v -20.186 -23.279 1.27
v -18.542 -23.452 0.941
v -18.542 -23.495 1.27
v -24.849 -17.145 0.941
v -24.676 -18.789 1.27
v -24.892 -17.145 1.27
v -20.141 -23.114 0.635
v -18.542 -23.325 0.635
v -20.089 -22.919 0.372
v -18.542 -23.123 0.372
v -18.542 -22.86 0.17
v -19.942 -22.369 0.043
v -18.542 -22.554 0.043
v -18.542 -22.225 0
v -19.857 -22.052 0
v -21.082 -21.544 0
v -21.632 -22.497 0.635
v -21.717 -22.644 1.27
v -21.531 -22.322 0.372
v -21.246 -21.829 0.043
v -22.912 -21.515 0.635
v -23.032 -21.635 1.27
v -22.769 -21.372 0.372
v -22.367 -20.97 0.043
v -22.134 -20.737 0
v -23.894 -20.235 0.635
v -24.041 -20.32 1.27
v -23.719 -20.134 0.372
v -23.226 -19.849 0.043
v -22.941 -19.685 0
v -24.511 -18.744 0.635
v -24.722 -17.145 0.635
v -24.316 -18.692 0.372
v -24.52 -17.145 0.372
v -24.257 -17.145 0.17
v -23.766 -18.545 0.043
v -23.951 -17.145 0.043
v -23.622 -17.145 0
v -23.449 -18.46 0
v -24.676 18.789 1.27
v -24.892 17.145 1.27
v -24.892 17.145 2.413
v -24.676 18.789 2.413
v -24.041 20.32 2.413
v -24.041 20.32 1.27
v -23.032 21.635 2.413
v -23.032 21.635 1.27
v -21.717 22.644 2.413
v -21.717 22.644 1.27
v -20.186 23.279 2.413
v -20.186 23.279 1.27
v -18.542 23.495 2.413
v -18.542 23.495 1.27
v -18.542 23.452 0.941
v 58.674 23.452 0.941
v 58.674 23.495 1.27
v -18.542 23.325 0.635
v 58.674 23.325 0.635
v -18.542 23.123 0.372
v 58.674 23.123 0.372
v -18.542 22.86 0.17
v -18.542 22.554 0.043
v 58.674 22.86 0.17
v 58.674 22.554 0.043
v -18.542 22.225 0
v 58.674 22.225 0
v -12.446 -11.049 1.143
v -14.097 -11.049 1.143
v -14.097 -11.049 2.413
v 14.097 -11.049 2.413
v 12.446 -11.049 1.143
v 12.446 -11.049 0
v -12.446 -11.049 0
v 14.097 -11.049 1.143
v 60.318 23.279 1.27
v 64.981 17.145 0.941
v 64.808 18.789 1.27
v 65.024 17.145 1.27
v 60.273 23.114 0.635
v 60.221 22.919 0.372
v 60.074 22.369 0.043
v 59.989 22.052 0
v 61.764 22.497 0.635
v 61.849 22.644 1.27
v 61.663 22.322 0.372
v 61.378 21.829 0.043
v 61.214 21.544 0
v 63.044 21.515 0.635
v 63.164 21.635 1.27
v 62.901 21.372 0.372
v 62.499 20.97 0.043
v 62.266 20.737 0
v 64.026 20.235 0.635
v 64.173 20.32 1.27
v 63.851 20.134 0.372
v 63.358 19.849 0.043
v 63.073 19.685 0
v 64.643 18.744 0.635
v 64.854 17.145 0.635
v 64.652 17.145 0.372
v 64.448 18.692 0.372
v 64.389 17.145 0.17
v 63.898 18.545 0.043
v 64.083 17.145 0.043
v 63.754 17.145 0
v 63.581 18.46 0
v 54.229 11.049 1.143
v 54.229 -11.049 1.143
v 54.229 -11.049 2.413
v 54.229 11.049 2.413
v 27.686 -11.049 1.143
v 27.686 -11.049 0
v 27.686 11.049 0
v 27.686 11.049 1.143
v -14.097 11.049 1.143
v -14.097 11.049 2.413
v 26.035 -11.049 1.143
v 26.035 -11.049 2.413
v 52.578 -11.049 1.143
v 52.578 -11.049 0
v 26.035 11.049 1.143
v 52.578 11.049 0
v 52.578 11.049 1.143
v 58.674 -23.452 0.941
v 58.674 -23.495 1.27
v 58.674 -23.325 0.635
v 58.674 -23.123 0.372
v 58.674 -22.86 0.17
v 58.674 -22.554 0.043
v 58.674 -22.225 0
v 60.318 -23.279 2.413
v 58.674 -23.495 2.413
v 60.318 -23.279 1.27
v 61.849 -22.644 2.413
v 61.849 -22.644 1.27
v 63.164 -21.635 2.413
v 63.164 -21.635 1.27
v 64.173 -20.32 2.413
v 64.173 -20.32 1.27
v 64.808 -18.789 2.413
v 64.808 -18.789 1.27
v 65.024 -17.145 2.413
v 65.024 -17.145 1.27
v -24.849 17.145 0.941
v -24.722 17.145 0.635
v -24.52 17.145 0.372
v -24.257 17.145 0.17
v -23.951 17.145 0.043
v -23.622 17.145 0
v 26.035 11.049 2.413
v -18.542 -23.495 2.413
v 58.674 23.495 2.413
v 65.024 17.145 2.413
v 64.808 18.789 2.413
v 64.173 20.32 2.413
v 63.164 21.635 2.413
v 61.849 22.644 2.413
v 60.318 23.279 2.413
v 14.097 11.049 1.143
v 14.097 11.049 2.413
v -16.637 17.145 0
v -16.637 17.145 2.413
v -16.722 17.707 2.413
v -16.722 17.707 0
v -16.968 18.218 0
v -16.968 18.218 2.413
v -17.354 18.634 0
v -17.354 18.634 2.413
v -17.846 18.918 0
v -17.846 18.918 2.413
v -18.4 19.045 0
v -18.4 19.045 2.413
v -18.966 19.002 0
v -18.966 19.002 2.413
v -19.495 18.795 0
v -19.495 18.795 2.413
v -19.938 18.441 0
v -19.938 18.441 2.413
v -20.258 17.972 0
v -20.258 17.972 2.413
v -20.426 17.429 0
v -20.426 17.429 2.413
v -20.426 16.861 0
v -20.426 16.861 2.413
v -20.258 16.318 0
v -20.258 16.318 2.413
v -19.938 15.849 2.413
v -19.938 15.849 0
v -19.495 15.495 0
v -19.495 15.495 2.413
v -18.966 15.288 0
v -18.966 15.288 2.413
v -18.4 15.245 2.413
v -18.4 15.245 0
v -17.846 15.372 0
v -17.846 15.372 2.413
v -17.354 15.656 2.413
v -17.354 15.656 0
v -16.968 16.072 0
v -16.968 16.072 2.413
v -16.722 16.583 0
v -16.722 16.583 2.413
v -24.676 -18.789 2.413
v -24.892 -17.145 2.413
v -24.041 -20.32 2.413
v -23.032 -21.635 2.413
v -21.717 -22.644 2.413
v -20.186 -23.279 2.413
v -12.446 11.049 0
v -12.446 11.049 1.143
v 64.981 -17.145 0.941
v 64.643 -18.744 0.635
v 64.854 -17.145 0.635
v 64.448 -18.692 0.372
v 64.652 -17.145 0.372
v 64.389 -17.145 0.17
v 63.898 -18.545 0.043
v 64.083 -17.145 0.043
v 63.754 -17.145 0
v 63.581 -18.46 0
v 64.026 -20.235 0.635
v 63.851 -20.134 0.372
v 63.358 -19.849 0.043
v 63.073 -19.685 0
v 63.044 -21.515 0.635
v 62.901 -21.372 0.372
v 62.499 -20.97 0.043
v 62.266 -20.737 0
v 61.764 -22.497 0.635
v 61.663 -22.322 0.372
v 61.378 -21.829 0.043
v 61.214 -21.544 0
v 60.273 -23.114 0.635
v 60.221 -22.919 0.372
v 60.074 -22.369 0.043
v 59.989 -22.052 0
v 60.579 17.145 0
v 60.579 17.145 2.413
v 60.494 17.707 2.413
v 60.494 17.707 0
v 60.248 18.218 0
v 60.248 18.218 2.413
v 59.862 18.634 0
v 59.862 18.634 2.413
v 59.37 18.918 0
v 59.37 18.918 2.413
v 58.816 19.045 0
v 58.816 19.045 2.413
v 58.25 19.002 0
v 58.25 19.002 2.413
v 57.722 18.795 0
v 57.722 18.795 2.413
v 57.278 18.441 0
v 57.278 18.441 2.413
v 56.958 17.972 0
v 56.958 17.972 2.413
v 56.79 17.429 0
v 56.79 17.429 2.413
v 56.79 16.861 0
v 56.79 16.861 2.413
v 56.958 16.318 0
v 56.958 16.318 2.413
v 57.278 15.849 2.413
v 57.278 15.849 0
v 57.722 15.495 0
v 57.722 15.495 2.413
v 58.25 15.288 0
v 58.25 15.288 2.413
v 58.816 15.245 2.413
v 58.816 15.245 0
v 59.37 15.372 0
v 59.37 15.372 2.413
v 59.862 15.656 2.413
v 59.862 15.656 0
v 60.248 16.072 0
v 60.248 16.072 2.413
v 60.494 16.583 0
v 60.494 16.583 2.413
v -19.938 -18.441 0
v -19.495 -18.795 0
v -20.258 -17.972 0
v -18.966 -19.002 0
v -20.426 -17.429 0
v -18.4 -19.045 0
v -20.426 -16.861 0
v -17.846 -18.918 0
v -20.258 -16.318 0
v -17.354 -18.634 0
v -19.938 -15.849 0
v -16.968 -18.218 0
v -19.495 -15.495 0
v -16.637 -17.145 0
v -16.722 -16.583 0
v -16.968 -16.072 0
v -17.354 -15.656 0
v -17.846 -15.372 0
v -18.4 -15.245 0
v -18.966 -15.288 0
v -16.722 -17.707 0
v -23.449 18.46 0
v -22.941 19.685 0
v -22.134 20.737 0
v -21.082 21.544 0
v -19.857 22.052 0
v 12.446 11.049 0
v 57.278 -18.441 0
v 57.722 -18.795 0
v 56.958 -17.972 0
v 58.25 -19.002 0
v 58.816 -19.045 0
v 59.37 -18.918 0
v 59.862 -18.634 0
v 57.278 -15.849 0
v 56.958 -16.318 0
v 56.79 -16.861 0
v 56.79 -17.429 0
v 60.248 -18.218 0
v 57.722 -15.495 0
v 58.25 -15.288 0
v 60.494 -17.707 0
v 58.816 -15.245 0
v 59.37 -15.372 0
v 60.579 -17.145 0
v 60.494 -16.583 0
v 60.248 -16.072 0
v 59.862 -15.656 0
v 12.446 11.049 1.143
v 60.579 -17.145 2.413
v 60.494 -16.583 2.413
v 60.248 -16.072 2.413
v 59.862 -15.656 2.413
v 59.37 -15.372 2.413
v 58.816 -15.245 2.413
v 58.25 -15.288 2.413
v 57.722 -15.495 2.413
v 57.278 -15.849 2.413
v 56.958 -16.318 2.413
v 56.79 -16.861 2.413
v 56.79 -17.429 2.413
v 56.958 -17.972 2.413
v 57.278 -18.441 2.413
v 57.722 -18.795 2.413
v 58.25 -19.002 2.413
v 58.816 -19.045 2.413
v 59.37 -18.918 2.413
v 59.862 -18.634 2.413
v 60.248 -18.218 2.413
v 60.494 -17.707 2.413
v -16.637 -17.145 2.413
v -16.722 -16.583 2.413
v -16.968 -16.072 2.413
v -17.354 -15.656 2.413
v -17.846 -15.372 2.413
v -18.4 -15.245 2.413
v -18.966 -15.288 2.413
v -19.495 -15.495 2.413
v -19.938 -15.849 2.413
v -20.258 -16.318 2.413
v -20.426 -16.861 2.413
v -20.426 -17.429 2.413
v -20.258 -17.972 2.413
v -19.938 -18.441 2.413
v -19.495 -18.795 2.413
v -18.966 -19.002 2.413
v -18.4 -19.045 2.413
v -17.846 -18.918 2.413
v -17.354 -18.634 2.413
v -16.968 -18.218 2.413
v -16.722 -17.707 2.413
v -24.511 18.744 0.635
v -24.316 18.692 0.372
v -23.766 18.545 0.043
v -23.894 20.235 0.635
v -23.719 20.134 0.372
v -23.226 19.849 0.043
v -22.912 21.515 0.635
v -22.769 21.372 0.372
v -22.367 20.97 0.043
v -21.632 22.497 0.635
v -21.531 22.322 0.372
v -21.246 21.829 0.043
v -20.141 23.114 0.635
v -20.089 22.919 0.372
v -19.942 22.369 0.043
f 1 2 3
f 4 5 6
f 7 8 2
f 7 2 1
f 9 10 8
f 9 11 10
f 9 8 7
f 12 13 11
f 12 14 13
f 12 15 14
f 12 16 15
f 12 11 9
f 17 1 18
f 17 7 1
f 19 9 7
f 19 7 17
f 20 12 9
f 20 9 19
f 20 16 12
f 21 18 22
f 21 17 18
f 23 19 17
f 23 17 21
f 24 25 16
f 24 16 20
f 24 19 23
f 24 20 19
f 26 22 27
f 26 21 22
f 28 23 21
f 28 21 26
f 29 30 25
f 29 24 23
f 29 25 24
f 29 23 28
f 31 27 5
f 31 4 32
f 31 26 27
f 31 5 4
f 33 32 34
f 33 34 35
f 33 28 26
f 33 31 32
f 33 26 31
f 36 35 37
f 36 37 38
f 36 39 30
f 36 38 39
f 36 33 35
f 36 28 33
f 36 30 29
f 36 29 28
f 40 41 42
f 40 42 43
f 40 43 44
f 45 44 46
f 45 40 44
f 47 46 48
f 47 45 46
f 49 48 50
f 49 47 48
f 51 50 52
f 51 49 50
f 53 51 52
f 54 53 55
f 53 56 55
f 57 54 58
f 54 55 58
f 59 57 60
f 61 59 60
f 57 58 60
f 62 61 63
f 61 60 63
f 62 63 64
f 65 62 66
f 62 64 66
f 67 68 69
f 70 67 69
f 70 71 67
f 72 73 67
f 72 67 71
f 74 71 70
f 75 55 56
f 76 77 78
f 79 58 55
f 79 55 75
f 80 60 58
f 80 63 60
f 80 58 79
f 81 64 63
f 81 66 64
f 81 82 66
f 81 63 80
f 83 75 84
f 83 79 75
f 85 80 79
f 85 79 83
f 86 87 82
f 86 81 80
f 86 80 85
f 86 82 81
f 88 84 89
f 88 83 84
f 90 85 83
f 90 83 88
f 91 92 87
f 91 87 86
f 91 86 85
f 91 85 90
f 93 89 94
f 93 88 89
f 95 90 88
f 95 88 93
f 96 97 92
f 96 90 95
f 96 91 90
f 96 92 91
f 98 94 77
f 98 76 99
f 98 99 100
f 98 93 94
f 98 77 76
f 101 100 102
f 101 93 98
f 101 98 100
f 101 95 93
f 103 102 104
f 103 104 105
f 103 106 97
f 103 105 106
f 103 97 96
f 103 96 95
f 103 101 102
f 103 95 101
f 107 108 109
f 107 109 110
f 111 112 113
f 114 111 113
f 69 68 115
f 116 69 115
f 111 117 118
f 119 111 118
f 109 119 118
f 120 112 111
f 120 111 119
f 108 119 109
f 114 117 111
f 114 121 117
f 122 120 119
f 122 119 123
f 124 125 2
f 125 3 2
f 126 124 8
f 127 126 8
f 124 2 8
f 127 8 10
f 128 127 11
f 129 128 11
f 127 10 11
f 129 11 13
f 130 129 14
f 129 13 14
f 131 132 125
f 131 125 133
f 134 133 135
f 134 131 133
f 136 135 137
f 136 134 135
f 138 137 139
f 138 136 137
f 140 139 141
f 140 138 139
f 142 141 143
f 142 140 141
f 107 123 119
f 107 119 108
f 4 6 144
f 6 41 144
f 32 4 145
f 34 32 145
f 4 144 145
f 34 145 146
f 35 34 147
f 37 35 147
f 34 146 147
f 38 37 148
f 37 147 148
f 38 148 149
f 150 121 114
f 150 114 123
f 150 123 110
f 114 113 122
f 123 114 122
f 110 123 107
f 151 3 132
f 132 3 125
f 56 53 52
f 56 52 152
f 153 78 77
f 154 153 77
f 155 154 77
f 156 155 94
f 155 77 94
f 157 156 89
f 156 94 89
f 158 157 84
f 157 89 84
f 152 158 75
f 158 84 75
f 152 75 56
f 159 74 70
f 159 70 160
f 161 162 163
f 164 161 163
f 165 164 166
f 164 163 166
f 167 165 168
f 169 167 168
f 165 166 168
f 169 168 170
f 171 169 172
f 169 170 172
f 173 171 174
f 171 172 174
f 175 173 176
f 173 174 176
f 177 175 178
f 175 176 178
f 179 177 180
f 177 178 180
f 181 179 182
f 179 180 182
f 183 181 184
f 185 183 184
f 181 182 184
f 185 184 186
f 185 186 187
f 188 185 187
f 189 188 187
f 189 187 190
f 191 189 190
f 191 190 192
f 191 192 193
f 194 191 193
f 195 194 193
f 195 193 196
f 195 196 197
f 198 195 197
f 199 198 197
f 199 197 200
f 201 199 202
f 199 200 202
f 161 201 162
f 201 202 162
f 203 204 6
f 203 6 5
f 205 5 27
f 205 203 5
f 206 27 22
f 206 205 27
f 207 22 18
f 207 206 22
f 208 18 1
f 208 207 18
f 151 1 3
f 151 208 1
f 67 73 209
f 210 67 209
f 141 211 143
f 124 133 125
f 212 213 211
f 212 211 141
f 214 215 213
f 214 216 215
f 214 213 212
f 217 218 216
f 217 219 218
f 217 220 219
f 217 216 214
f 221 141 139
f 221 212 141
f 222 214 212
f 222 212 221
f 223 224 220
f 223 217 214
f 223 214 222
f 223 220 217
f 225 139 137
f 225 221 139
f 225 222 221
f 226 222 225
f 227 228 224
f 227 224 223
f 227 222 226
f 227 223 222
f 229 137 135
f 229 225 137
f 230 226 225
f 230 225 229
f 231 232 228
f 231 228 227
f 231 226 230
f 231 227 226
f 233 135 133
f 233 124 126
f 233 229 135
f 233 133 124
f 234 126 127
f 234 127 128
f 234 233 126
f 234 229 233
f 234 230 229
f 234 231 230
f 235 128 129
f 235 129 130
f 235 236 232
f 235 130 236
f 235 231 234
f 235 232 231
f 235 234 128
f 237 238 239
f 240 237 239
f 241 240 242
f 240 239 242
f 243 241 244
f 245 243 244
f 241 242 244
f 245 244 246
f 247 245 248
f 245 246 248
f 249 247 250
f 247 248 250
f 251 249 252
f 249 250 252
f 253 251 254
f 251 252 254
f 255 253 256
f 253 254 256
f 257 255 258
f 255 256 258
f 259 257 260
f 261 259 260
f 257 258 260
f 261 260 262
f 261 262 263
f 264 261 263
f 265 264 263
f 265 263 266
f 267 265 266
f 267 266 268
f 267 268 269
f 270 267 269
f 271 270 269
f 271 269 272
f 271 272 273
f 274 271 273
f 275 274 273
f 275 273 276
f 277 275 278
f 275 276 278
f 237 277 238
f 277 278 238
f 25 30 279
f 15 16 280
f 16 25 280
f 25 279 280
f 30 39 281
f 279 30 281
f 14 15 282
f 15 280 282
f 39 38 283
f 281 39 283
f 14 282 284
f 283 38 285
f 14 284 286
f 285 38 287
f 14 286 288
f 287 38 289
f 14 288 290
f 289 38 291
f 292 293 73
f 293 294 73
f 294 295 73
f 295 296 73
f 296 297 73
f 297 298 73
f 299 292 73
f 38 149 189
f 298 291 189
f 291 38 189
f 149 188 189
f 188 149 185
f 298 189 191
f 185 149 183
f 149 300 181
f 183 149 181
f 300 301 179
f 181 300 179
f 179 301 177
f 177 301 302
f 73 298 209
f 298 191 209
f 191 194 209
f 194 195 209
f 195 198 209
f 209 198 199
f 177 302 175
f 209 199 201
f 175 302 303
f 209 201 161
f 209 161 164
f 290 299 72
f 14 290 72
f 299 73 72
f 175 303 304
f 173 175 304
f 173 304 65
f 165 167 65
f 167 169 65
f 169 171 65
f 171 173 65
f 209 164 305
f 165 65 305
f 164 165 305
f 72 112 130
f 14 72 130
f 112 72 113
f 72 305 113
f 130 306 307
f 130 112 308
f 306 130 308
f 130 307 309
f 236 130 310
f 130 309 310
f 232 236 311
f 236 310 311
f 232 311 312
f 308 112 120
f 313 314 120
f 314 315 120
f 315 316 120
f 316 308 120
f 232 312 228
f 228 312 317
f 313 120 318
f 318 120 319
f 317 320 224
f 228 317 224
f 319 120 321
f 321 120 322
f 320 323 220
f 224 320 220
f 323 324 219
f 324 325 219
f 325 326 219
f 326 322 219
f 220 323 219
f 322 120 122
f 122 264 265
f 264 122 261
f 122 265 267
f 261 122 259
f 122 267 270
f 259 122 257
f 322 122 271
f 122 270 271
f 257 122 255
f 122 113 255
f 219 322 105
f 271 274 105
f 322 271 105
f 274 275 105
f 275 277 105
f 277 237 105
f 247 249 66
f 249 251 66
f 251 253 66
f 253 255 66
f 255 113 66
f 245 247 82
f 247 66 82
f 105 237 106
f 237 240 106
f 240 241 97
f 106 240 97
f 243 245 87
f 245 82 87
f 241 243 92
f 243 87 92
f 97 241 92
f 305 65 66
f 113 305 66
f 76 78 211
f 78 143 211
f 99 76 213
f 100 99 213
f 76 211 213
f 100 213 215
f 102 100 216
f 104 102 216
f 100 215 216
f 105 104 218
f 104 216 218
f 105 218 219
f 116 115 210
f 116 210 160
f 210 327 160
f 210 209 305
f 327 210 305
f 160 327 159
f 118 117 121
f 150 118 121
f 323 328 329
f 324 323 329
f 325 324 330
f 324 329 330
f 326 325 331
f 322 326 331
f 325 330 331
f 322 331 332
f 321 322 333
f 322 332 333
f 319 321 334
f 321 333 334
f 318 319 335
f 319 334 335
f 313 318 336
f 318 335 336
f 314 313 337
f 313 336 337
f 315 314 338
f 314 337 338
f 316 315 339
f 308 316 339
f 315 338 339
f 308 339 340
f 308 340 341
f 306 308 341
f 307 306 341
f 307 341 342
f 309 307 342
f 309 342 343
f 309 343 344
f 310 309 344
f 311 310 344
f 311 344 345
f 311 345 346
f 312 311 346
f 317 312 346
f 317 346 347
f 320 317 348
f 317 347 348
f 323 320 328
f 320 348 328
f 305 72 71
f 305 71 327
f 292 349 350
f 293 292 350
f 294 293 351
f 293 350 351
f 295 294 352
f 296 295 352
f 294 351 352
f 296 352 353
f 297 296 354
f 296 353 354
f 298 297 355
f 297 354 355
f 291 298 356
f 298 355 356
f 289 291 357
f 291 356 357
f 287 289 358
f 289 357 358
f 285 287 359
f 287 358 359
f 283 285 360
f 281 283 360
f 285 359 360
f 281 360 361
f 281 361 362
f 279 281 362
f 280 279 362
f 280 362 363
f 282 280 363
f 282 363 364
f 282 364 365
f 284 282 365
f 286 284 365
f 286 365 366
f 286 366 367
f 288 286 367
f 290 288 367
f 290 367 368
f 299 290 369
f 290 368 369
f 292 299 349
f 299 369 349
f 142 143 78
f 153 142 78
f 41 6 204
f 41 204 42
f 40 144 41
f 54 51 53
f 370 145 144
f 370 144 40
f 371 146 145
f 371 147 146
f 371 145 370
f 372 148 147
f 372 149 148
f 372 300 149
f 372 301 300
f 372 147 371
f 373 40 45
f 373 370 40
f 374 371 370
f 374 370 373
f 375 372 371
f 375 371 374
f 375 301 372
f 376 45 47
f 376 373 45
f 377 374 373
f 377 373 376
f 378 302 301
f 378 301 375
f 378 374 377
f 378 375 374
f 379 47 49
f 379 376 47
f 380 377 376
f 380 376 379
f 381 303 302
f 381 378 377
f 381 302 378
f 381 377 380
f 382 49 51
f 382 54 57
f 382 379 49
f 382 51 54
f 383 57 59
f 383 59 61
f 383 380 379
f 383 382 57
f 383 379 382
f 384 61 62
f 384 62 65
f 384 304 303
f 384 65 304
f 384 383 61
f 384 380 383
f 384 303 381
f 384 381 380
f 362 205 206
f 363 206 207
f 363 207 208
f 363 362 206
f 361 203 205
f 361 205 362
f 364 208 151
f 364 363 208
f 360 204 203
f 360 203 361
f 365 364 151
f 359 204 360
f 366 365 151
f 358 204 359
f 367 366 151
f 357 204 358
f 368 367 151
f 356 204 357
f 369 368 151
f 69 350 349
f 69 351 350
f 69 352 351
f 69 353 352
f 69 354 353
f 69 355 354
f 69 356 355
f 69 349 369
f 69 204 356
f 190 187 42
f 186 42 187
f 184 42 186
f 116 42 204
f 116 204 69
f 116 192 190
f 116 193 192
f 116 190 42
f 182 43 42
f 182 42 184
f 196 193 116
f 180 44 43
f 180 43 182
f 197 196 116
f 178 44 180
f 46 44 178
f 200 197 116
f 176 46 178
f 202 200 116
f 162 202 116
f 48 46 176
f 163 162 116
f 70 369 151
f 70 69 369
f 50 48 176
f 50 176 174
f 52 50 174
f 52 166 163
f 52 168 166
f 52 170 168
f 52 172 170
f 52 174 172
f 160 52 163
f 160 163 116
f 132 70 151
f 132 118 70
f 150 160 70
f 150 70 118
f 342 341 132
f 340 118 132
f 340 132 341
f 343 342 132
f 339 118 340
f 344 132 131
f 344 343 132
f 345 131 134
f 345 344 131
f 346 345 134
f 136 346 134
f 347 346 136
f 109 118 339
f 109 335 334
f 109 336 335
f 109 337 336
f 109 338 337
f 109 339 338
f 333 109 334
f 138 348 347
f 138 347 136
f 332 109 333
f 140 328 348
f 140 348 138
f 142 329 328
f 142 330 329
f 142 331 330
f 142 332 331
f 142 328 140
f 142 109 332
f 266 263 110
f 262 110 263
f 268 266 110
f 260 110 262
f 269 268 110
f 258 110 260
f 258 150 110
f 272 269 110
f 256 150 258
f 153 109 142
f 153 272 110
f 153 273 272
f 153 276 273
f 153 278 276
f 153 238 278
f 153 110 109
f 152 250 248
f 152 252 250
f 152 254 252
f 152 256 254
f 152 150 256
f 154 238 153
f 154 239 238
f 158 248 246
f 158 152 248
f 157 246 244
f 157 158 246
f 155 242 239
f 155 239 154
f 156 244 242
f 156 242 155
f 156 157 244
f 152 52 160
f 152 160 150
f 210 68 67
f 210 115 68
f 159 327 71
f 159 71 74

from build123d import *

# Parameters (mm, degrees)
F0_W     = 89.916
F0_H     = 46.99
F0_W_2   = 24.892
F0_H_2   = 22.098
F1_DEPTH = 1.143
F2_W     = 89.916
F2_H     = 46.99
F2_W_2   = 28.194
F2_H_2   = 22.098
F3_DEPTH = 1.27
F4_R     = 6.35
F5_R     = 1.905
F6_DEPTH = 2.413
F7_R     = 1.27


with BuildPart() as f1:
    # F0 (on Top) → F1 (new body)
    with BuildSketch(Plane.XY):
        with Locations((20.066, 0)):
            Rectangle(F0_W, F0_H)
        Rectangle(F0_W_2, F0_H_2, mode=Mode.SUBTRACT)
        with Locations((40.132, 0)):
            Rectangle(F0_W_2, F0_H_2, mode=Mode.SUBTRACT)
    extrude(amount=F1_DEPTH)

    # F2 (on face) → F3 (join)
    with BuildSketch(Plane.XY.offset(1.143)):
        with Locations((20.066, 0)):
            Rectangle(F2_W, F2_H)
        Rectangle(F2_W_2, F2_H_2, mode=Mode.SUBTRACT)
        with Locations((40.132, 0)):
            Rectangle(F2_W_2, F2_H_2, mode=Mode.SUBTRACT)
    extrude(amount=F3_DEPTH)

    # F4
    f4_edges = [f1.edges().sort_by_distance(p)[0] for p in [
        (-24.892, -23.495, 1.2065),
        (-24.892, 23.495, 1.2065),
        (65.024, -23.495, 1.2065),
        (65.024, 23.495, 1.2065),
    ]]
    fillet(f4_edges, radius=F4_R)

    # F5 (on face) → F6 (cut, through all)
    with BuildSketch(Plane.XY.offset(2.413)):
        with Locations((-18.542, 17.145)):
            Circle(F5_R)
        with Locations((-18.542, -17.145)):
            Circle(F5_R)
        with Locations((58.674, -17.145)):
            Circle(F5_R)
        with Locations((58.674, 17.145)):
            Circle(F5_R)
    extrude(amount=-F6_DEPTH, mode=Mode.SUBTRACT)

    # F7
    f7_edges = [f1.edges().sort_by_distance(p)[0] for p in [
        (-23.032128, 21.635128, 0),
    ]]
    fillet(f7_edges, radius=F7_R)


solid = f1.part
